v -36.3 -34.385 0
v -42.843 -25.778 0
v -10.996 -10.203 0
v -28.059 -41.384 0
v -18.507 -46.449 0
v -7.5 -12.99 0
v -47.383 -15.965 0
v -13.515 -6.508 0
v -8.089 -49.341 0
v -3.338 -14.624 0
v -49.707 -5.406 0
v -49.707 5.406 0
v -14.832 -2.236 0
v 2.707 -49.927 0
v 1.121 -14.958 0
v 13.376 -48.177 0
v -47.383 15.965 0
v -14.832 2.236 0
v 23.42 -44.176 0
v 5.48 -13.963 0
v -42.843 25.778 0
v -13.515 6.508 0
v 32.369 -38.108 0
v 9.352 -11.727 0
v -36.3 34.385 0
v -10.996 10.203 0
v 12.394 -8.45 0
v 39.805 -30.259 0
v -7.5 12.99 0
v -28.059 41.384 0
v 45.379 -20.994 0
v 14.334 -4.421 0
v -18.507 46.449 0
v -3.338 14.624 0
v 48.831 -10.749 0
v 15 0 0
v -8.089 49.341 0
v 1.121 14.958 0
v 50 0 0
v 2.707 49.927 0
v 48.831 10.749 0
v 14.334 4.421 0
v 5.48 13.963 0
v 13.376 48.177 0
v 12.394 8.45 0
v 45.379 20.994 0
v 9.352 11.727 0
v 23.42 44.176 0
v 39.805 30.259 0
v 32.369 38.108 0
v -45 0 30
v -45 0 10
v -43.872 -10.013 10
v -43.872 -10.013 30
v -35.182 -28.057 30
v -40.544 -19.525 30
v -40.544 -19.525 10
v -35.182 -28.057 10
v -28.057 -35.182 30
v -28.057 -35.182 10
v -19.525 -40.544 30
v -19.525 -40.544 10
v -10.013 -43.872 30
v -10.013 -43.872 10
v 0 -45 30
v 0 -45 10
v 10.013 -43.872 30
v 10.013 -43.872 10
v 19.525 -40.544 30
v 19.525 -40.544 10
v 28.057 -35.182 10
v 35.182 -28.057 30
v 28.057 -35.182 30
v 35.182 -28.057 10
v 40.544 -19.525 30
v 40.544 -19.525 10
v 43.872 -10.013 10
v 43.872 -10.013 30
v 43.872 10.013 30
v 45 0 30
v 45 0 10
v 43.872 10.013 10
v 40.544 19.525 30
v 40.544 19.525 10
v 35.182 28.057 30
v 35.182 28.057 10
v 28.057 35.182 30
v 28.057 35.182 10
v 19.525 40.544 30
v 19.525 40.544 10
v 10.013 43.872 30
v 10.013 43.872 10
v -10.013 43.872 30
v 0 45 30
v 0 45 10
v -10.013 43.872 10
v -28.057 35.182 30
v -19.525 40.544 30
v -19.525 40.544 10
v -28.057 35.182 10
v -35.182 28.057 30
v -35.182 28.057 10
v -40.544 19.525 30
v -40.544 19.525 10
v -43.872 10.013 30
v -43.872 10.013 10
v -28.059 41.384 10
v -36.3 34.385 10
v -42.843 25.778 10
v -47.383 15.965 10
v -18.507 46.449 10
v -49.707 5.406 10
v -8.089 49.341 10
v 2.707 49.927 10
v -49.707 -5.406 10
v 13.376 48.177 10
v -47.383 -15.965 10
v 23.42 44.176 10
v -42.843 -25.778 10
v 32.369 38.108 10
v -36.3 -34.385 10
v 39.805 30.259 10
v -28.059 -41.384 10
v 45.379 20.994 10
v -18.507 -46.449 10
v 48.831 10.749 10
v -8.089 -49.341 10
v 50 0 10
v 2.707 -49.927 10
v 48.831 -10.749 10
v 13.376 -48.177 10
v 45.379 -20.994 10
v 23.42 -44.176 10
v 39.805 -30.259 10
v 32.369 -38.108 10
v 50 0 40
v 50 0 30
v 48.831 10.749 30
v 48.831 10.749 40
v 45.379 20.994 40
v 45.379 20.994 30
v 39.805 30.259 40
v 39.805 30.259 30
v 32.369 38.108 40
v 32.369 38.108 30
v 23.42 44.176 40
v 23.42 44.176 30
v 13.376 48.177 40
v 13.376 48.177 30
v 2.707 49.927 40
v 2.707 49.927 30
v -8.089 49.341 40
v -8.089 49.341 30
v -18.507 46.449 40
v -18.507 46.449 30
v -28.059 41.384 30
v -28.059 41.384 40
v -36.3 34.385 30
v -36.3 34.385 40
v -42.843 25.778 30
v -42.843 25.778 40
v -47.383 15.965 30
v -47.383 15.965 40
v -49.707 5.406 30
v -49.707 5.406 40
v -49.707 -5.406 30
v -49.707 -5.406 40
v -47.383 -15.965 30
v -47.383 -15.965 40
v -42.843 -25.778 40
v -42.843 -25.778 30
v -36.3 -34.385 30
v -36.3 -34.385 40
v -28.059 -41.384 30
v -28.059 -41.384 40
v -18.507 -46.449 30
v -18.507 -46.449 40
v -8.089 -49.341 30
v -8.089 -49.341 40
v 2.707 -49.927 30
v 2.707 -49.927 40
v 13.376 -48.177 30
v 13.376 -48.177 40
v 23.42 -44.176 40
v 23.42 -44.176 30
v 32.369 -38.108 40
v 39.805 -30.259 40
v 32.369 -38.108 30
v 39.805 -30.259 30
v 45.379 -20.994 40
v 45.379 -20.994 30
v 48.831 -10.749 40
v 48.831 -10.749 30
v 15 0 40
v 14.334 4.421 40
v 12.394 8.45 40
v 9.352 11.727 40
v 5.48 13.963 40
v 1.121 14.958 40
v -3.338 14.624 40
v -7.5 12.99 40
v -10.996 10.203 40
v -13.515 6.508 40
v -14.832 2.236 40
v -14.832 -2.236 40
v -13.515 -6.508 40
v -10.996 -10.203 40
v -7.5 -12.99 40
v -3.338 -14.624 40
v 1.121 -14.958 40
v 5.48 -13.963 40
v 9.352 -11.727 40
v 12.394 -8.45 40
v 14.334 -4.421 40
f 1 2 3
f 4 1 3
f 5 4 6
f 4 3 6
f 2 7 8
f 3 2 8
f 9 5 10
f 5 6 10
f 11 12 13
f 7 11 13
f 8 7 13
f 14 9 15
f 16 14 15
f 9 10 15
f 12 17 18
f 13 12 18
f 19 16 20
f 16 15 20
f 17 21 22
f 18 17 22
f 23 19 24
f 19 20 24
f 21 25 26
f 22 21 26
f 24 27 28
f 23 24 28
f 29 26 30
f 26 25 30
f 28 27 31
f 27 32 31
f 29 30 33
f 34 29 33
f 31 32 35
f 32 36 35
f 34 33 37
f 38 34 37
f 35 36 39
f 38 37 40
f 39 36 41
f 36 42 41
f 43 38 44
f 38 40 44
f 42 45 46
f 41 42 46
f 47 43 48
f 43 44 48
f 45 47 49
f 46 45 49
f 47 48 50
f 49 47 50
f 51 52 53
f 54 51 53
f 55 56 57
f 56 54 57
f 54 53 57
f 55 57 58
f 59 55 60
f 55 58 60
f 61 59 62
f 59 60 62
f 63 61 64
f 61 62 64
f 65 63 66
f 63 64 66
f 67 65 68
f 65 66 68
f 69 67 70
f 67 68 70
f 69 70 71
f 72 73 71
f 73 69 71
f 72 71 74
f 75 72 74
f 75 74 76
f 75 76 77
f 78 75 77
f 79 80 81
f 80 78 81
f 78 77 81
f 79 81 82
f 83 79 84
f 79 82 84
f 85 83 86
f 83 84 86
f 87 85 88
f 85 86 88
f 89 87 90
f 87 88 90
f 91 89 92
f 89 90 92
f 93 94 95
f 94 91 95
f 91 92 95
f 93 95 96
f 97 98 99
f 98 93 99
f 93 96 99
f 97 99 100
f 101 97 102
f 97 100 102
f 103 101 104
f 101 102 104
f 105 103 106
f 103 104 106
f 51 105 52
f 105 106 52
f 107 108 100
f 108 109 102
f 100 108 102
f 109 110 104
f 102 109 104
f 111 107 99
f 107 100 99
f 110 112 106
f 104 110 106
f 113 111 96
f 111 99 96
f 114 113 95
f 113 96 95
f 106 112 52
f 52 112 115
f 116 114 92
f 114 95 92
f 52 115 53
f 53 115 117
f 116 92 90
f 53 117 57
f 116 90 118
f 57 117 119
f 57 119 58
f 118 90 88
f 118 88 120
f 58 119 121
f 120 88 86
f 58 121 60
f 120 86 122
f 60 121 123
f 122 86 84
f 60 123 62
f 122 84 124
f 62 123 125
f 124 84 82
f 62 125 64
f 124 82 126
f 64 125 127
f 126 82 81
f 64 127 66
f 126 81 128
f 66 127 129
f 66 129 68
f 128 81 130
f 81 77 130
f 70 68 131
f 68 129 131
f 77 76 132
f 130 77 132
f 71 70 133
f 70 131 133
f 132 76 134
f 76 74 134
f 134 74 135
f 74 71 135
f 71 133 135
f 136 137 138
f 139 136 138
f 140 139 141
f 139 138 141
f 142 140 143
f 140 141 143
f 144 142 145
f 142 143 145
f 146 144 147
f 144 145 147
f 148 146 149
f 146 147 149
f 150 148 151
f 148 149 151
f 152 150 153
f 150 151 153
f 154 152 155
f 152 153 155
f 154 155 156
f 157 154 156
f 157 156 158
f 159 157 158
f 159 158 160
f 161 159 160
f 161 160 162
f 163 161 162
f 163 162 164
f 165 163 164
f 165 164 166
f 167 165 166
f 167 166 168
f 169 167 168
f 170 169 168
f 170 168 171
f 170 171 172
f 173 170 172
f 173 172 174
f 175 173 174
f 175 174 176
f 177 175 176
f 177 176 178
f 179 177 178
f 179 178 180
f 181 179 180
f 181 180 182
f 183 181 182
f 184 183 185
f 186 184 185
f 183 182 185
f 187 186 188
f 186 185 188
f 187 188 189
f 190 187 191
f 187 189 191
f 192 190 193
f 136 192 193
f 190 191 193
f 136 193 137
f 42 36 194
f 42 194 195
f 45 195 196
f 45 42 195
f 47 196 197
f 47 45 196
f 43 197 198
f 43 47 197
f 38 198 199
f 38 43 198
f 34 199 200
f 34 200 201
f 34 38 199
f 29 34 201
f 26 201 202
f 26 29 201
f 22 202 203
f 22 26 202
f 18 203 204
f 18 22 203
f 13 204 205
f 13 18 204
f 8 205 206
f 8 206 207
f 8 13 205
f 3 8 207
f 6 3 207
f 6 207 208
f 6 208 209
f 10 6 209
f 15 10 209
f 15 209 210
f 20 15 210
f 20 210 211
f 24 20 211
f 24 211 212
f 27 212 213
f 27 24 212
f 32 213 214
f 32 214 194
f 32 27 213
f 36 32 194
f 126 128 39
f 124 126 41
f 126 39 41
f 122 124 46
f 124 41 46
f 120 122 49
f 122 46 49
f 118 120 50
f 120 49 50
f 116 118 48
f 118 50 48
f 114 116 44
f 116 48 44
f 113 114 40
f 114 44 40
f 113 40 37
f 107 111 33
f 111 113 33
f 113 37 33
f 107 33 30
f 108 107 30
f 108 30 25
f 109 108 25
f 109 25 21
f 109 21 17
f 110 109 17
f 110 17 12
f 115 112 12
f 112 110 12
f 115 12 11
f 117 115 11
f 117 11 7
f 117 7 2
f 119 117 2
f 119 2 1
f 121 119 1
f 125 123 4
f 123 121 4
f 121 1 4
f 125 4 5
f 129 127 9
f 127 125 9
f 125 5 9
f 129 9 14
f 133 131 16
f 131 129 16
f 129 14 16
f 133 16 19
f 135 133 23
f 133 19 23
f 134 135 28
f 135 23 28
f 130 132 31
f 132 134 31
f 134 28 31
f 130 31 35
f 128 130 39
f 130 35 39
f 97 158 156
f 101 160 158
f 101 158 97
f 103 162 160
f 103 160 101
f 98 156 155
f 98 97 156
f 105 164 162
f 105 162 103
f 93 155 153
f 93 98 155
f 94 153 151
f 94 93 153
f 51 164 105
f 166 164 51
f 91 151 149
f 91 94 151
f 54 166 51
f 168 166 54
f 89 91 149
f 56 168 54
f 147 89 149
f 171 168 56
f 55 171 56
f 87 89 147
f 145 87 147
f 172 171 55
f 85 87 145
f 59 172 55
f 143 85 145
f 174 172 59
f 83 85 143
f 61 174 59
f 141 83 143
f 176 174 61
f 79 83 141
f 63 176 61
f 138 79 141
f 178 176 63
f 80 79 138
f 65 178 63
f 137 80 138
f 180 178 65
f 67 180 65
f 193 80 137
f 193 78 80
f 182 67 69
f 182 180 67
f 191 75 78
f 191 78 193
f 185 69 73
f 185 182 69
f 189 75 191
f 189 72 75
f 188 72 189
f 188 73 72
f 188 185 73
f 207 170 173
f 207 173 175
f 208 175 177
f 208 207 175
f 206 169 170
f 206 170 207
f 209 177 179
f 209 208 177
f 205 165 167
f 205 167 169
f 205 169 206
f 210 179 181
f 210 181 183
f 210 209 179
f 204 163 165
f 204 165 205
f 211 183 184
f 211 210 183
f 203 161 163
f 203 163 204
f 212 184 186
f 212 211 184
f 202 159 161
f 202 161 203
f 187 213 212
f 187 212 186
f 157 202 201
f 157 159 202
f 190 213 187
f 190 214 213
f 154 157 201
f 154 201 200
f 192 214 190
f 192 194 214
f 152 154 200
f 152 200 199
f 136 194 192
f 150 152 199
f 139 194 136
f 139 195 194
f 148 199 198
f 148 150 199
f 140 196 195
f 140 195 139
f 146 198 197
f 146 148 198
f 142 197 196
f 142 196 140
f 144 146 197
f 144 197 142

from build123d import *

# Parameters (mm, degrees)
SKETCH1_R           = 50
SKETCH1_R_2         = 15
BOSS_EXTRUDE1_DEPTH = 40
SKETCH2_W           = 20
SKETCH2_H           = 5


with BuildPart() as part:
    # Sketch1 → Boss-Extrude1 (new body)
    with BuildSketch(Plane.XY):
        Circle(SKETCH1_R)
        Circle(SKETCH1_R_2, mode=Mode.SUBTRACT)
    extrude(amount=BOSS_EXTRUDE1_DEPTH)

    # Sketch2 → Cut-Revolve1 (revolve, cut)
    with BuildSketch(Plane(origin=(0, 0, 0), x_dir=(0, 0, -1), z_dir=(1, 0, 0)), mode=Mode.PRIVATE) as cut_revolve1_sk:
        with Locations((-20, 47.5)):
            Rectangle(SKETCH2_W, SKETCH2_H)
        with Locations((-20, -47.5)):
            Rectangle(SKETCH2_W, SKETCH2_H)
    revolve(cut_revolve1_sk.sketch.rotate(Axis((0, 0, -46.879295237), (0, 0, 1)), 90), axis=Axis((0, 0, -46.879295237), (0, 0, 1)), mode=Mode.SUBTRACT)


solid = part.part
